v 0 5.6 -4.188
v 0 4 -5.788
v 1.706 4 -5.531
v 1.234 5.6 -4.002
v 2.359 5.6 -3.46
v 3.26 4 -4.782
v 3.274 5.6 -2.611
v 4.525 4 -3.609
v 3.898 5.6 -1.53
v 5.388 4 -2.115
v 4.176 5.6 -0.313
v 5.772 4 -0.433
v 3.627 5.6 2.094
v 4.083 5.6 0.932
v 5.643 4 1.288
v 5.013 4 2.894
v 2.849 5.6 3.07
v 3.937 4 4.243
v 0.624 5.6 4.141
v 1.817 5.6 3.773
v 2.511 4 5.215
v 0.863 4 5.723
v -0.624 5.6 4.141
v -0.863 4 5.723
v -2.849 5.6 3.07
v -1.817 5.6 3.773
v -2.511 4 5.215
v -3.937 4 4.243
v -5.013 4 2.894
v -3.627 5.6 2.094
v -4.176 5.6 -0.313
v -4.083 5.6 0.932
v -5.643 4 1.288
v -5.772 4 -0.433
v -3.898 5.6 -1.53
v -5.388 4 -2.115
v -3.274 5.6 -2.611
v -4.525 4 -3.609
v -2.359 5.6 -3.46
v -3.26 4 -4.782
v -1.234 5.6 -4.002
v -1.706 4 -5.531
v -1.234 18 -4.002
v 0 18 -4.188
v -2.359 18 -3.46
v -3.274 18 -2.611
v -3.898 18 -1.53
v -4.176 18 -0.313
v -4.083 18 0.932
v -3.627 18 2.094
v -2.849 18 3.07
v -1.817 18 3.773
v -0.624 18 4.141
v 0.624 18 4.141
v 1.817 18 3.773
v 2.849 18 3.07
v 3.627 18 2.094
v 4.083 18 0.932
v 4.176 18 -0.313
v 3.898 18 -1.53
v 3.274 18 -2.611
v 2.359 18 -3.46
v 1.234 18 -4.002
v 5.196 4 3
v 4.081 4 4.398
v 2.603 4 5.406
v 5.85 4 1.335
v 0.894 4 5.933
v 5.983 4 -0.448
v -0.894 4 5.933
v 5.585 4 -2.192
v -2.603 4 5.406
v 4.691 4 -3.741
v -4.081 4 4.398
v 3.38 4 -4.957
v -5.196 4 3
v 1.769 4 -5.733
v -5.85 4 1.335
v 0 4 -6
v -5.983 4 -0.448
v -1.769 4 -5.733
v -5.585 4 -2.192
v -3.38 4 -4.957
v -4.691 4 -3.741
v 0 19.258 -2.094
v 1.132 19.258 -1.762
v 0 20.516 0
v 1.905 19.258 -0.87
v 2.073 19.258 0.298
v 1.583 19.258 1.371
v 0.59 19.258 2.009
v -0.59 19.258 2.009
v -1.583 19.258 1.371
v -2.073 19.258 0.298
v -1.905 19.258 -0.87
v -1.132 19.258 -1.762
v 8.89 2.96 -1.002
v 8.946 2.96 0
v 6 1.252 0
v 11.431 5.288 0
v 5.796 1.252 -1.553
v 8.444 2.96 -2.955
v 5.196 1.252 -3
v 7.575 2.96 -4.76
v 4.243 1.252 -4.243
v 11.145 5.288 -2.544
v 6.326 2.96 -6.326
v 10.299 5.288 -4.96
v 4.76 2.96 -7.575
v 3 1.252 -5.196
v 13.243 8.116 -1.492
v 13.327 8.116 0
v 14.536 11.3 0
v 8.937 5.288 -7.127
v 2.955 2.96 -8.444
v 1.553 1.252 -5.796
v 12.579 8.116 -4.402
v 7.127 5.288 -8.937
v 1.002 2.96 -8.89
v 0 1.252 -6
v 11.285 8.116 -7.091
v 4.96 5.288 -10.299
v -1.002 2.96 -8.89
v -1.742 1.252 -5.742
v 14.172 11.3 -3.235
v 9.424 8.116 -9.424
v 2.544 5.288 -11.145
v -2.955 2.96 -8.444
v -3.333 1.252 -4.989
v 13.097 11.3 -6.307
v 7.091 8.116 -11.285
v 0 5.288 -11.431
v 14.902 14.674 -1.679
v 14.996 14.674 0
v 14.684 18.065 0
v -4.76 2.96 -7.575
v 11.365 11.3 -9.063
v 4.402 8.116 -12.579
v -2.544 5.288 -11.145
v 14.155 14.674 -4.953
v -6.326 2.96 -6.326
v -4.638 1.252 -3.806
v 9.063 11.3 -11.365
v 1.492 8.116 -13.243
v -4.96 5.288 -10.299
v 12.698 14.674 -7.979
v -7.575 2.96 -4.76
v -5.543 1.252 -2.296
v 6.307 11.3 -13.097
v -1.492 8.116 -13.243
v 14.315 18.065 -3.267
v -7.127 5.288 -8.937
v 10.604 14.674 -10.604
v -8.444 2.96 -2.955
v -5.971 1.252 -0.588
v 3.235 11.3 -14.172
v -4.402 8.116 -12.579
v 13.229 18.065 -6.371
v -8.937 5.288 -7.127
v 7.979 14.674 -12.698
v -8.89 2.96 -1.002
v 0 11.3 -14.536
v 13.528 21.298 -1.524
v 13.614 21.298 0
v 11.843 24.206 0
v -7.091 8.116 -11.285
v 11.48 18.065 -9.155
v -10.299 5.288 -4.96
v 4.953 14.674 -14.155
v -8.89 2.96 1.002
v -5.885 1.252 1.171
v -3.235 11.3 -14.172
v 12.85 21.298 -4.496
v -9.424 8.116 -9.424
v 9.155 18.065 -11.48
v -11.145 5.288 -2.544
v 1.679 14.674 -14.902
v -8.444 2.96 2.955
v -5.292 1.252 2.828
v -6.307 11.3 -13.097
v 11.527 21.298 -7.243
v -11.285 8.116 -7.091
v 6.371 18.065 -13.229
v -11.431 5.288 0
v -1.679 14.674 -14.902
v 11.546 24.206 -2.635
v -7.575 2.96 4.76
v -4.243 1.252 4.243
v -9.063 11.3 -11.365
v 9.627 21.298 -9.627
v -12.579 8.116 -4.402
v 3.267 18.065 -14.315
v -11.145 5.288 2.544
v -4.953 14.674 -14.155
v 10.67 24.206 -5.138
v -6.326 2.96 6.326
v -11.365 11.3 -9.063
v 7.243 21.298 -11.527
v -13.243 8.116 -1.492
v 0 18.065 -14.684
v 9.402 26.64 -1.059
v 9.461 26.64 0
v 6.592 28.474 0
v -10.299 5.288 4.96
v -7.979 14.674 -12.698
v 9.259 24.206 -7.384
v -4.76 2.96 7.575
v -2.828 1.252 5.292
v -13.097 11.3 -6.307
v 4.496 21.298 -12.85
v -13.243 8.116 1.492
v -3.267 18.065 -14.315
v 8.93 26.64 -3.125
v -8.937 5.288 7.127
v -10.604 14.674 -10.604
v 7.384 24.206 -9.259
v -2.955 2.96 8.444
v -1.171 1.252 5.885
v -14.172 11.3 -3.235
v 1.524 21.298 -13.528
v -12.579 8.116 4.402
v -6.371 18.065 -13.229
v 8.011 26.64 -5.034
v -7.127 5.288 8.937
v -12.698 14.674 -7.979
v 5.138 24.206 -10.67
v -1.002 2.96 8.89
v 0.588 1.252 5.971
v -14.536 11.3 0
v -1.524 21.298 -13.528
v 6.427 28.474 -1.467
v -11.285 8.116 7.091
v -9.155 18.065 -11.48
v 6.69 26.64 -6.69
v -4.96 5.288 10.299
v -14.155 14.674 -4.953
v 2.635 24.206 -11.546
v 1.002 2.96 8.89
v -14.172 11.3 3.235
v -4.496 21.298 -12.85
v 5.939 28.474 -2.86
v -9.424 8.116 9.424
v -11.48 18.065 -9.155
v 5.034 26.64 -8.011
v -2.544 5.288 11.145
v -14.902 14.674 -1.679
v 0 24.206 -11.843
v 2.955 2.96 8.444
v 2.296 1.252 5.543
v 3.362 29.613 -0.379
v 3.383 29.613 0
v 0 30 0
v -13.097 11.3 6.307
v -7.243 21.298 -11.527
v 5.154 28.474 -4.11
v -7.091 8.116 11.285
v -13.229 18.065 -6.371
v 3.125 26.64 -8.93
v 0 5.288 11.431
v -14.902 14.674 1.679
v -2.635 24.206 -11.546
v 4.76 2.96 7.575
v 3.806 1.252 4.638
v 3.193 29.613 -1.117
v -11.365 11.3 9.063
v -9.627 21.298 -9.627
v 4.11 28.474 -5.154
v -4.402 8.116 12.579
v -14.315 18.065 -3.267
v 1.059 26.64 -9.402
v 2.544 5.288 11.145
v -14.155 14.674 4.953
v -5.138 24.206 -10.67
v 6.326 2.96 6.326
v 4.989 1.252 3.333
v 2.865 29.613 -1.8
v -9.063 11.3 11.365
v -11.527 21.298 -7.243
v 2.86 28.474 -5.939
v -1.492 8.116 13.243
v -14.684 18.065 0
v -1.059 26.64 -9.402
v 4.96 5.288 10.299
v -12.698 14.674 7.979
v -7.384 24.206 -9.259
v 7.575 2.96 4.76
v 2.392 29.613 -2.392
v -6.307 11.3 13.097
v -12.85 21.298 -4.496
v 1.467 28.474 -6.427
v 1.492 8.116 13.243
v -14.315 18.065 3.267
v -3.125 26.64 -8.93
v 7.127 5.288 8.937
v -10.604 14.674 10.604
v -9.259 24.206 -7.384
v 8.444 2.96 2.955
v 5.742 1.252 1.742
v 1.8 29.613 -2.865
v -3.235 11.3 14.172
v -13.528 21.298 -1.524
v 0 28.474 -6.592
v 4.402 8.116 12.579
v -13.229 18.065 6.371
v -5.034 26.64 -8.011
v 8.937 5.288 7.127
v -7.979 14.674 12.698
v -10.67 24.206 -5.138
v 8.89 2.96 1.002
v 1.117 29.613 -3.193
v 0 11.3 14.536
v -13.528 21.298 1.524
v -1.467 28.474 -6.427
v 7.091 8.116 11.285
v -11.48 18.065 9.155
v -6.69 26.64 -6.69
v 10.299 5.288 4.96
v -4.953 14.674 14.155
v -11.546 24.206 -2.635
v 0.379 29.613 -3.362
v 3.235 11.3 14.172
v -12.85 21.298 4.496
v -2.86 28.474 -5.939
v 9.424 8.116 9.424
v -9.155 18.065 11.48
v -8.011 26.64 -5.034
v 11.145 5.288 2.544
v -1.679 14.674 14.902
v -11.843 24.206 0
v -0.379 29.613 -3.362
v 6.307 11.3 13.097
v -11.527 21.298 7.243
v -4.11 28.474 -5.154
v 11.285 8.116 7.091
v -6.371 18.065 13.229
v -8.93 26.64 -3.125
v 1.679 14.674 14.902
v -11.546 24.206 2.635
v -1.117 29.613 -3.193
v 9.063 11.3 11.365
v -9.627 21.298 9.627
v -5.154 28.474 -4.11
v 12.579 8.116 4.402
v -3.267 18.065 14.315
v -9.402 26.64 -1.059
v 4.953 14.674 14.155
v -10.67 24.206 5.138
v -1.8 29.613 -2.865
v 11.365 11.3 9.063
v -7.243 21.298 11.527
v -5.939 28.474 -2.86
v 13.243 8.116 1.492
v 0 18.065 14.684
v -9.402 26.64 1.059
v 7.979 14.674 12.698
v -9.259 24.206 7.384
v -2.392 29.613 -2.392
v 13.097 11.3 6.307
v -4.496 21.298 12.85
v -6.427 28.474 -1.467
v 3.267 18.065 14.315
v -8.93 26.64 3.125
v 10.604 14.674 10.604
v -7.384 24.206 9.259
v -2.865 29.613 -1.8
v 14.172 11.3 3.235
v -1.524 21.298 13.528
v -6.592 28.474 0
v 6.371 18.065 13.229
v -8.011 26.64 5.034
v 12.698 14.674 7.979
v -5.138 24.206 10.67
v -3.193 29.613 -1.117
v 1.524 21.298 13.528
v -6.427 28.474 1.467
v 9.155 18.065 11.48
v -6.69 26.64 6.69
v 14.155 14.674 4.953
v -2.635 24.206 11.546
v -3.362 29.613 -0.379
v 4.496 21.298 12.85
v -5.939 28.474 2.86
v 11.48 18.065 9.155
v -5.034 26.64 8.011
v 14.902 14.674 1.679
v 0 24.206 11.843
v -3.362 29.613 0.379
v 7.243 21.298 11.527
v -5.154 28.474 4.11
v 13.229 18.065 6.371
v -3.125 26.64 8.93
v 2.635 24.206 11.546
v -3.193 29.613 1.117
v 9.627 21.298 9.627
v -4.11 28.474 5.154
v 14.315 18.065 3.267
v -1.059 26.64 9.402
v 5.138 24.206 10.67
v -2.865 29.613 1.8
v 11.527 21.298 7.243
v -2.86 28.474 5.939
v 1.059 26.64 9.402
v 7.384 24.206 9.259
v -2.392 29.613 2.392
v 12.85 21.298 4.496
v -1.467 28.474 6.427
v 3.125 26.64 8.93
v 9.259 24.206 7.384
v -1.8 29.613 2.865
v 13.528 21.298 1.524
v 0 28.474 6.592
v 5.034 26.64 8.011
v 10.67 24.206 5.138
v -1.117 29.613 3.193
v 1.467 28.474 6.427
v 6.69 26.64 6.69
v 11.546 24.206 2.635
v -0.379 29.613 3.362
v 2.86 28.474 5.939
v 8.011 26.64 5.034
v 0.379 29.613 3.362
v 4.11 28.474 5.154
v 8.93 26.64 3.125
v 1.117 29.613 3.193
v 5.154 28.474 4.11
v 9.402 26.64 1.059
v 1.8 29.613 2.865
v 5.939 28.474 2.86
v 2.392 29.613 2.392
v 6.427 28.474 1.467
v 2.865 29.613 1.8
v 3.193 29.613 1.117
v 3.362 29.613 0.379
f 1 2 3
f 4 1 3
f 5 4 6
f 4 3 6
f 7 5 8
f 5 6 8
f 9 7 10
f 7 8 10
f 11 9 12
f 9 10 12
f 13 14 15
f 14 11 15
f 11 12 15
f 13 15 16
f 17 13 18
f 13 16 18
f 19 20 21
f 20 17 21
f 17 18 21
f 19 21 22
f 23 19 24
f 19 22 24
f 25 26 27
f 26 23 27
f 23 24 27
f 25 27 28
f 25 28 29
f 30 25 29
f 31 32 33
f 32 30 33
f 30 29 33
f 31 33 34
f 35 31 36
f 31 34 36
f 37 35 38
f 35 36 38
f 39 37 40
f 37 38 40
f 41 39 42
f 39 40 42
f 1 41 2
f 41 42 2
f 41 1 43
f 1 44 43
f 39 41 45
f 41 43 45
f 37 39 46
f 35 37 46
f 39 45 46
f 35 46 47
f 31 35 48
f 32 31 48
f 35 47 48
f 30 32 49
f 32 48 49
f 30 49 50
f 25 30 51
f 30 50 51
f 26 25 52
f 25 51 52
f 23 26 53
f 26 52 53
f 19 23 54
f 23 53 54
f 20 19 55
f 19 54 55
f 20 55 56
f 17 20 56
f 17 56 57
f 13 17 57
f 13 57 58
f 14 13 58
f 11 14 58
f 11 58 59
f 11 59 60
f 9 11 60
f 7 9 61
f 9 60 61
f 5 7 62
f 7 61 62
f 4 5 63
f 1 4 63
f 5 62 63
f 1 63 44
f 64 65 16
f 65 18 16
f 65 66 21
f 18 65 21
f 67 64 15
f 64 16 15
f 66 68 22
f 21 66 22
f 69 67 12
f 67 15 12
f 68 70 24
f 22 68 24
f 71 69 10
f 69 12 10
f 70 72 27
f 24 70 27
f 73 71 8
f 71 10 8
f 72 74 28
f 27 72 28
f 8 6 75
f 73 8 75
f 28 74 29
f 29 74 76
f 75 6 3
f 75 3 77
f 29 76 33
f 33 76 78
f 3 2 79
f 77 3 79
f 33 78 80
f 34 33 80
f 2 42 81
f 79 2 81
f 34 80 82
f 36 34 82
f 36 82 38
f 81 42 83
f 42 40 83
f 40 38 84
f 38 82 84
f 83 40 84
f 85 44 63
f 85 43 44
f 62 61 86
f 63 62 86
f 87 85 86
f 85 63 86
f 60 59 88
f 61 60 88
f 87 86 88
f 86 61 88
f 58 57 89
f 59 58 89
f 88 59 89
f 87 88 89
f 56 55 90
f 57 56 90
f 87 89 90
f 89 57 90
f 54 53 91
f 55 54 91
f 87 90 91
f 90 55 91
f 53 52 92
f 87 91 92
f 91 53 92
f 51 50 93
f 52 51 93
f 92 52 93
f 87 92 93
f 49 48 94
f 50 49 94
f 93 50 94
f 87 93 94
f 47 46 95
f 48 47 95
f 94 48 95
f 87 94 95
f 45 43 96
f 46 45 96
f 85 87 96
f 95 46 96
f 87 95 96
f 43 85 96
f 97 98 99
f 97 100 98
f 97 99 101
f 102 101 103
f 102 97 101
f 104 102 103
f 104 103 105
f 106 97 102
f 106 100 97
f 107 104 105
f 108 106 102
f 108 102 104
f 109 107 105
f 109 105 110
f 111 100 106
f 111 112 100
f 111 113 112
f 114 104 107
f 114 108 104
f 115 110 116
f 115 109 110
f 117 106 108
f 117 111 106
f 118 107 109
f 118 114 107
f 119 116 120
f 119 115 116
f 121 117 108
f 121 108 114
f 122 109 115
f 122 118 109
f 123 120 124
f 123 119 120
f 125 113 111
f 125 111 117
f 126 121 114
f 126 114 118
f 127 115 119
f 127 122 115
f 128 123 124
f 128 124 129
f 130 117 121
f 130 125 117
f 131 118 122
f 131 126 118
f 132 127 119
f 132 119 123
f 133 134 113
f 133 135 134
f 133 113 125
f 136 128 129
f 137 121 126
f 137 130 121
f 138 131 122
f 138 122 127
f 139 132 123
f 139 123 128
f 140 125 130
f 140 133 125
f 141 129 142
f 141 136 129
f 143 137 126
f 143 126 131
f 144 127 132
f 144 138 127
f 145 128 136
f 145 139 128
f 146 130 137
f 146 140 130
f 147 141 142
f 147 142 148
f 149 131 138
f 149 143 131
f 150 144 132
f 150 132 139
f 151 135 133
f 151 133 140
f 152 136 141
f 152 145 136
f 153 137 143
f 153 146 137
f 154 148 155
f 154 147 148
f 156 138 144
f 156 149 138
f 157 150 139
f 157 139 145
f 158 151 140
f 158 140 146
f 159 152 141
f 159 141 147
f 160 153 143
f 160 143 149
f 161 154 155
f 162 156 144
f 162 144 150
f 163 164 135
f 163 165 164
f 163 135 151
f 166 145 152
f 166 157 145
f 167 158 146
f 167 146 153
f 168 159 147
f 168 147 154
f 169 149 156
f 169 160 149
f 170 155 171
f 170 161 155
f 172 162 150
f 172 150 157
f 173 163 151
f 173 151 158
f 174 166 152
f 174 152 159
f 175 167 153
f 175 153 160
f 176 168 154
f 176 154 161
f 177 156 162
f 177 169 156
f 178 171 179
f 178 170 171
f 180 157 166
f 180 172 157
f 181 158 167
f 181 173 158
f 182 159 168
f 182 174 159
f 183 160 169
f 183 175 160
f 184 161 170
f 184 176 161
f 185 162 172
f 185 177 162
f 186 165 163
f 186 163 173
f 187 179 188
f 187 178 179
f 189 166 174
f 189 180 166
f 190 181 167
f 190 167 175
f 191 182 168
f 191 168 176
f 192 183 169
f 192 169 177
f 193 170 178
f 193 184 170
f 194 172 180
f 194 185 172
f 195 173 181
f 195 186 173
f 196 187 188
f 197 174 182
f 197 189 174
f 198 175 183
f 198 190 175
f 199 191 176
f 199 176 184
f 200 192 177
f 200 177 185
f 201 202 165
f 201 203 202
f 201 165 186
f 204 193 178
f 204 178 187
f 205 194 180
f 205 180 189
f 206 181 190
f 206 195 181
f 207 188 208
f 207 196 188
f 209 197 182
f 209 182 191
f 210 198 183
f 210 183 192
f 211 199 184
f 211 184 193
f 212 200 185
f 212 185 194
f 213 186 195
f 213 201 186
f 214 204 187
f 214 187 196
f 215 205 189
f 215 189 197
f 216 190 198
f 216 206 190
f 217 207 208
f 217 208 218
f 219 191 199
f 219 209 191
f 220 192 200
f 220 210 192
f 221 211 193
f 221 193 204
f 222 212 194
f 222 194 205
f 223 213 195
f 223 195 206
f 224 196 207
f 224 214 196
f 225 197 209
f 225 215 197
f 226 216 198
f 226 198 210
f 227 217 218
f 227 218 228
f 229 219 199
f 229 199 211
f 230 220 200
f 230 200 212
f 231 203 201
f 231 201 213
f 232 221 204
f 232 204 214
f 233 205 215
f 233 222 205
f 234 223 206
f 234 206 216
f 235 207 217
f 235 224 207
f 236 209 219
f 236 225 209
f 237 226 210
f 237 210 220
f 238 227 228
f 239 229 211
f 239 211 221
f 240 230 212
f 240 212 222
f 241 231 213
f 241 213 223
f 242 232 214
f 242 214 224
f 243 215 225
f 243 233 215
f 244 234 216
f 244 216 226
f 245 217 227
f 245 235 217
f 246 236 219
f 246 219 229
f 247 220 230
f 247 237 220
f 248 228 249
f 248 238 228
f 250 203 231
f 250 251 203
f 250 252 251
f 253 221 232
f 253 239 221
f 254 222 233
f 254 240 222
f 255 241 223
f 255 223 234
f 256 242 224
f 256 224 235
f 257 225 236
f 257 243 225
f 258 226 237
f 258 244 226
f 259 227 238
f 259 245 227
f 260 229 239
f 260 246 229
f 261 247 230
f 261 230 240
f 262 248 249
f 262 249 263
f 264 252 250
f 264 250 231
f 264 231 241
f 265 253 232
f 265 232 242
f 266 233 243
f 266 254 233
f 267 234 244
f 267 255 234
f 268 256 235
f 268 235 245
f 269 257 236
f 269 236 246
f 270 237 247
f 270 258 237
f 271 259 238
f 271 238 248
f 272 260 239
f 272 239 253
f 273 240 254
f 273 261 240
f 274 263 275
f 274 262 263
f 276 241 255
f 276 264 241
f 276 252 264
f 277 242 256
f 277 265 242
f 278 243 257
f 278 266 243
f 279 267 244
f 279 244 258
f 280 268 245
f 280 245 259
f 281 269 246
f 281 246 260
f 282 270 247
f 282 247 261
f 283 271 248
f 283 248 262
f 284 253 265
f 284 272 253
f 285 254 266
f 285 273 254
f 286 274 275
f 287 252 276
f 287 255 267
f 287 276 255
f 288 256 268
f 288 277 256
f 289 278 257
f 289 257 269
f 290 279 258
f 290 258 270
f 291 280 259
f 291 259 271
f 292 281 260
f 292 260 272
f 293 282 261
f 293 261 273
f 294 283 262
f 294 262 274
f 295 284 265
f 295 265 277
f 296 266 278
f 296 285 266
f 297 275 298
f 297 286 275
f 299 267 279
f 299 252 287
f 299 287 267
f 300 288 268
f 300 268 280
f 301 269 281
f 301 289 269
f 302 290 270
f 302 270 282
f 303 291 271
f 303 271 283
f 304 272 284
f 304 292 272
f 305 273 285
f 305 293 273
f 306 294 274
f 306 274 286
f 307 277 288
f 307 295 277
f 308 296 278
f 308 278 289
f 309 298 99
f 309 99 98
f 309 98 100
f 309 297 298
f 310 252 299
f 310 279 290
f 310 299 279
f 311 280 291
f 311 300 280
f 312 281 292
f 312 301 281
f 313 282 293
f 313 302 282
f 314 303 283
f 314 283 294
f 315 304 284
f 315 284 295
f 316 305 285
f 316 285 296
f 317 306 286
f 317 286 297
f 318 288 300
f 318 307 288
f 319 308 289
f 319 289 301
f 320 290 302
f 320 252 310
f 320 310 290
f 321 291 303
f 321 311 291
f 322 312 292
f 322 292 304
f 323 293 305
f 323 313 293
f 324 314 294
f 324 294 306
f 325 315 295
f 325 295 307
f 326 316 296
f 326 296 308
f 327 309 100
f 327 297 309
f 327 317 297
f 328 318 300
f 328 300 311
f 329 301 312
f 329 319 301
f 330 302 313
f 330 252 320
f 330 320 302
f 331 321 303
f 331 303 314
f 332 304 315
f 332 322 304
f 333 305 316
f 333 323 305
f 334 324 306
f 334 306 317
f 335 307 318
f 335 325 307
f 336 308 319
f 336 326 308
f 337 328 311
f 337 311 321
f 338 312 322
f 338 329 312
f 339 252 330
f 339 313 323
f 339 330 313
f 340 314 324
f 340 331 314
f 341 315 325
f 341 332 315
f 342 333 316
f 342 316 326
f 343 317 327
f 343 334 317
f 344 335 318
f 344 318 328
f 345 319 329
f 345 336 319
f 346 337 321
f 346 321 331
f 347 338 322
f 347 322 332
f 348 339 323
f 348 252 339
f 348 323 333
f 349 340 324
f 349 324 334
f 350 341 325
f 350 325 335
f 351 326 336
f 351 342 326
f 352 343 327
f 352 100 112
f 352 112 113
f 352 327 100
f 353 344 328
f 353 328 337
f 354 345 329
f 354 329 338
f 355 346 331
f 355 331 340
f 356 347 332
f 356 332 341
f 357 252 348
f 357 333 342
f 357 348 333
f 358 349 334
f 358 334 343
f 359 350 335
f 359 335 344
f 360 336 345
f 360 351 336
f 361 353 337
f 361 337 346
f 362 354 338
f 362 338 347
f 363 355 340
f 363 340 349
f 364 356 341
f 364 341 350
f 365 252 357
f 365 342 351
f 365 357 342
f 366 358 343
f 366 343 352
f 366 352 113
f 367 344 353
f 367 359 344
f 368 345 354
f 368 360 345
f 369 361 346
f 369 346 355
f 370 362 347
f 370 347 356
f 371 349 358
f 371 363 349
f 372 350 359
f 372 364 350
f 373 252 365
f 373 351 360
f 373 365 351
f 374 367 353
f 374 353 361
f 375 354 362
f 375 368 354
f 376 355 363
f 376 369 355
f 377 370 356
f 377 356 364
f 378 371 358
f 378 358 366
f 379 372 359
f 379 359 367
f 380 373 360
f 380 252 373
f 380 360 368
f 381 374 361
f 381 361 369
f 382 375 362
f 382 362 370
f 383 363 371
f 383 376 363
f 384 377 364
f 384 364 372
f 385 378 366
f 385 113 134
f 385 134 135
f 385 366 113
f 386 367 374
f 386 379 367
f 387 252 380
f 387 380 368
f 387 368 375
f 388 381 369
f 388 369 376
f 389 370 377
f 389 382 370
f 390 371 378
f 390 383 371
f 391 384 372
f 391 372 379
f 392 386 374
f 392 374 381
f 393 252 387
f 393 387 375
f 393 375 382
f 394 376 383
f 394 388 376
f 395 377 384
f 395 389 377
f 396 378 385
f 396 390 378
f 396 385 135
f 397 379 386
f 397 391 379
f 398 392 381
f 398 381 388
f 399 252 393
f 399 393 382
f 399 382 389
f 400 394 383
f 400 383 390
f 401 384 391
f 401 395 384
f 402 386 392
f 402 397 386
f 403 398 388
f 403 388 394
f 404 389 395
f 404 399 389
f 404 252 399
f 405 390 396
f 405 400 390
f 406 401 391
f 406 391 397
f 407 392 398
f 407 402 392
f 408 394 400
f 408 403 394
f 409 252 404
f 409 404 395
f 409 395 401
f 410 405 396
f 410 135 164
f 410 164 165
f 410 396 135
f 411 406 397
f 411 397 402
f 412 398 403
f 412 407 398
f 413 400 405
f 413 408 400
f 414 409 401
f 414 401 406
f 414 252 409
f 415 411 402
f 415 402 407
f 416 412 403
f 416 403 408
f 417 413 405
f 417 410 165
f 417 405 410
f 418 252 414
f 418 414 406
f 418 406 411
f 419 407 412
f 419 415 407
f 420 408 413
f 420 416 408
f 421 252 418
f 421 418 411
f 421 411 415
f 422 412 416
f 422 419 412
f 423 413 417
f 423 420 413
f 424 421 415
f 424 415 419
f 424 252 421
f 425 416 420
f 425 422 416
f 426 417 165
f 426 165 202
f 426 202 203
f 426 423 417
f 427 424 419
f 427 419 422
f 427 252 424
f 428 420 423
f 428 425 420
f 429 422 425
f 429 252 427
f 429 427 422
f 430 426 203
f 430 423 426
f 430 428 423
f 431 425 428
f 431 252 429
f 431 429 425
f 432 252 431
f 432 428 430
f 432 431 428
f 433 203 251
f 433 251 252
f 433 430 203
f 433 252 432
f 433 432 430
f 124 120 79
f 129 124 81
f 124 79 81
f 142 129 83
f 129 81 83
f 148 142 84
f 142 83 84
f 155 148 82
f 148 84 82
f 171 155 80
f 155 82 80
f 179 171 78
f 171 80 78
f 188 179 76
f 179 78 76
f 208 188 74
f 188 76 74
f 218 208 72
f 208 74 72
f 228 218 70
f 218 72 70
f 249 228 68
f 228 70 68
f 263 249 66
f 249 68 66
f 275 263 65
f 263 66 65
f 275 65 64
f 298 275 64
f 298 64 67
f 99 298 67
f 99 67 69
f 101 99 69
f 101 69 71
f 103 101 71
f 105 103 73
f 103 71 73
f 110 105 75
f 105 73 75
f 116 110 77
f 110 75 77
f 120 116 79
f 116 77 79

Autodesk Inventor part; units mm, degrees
ref_plane "YZ Plane" through (0, 0, 0) normal (1, 0, 0) x (0, 1, 0)
ref_plane "XZ Plane" through (0, 0, 0) normal (0, 1, 0) x (-1, 0, 0)
ref_plane "XY Plane" through (0, 0, 0) normal (0, 0, 1) x (1, 0, 0)
sketch "Эскиз1" plane through (0, 0, 0) normal (0, 0, 1) x (1, 0, 0)
  arc A0 (0, 0) -> (0, 30) centre (0, 15) ccw
  line L0 (0, 0) -> (0, 30)
  dimension "d0" = 30
revolve "Вращение1" add sketch "Эскиз1" angle 360 about axis through (0, 0, 0) along (0, 1, 0)
sketch "Эскиз2" plane through (0, 0, 0) normal (0, 1, 0) x (-1, 0, 0)
  point P0 (0, 0)
  point P1 (0, 0)
hole "Отверстие1" at (0, 0, 0) direction (0, 1, 0) diameter 8.376 depth 18 tip angle 118 counterbore diameter 12 counterbore depth 4 thread size "M10x1.5" class "6H" standard "ISO Metric profile"
chamfer "Фаска1" distance 1.6 angle 45 1 edges at (0, 4, 4.188)
properties part number "Ручка"
